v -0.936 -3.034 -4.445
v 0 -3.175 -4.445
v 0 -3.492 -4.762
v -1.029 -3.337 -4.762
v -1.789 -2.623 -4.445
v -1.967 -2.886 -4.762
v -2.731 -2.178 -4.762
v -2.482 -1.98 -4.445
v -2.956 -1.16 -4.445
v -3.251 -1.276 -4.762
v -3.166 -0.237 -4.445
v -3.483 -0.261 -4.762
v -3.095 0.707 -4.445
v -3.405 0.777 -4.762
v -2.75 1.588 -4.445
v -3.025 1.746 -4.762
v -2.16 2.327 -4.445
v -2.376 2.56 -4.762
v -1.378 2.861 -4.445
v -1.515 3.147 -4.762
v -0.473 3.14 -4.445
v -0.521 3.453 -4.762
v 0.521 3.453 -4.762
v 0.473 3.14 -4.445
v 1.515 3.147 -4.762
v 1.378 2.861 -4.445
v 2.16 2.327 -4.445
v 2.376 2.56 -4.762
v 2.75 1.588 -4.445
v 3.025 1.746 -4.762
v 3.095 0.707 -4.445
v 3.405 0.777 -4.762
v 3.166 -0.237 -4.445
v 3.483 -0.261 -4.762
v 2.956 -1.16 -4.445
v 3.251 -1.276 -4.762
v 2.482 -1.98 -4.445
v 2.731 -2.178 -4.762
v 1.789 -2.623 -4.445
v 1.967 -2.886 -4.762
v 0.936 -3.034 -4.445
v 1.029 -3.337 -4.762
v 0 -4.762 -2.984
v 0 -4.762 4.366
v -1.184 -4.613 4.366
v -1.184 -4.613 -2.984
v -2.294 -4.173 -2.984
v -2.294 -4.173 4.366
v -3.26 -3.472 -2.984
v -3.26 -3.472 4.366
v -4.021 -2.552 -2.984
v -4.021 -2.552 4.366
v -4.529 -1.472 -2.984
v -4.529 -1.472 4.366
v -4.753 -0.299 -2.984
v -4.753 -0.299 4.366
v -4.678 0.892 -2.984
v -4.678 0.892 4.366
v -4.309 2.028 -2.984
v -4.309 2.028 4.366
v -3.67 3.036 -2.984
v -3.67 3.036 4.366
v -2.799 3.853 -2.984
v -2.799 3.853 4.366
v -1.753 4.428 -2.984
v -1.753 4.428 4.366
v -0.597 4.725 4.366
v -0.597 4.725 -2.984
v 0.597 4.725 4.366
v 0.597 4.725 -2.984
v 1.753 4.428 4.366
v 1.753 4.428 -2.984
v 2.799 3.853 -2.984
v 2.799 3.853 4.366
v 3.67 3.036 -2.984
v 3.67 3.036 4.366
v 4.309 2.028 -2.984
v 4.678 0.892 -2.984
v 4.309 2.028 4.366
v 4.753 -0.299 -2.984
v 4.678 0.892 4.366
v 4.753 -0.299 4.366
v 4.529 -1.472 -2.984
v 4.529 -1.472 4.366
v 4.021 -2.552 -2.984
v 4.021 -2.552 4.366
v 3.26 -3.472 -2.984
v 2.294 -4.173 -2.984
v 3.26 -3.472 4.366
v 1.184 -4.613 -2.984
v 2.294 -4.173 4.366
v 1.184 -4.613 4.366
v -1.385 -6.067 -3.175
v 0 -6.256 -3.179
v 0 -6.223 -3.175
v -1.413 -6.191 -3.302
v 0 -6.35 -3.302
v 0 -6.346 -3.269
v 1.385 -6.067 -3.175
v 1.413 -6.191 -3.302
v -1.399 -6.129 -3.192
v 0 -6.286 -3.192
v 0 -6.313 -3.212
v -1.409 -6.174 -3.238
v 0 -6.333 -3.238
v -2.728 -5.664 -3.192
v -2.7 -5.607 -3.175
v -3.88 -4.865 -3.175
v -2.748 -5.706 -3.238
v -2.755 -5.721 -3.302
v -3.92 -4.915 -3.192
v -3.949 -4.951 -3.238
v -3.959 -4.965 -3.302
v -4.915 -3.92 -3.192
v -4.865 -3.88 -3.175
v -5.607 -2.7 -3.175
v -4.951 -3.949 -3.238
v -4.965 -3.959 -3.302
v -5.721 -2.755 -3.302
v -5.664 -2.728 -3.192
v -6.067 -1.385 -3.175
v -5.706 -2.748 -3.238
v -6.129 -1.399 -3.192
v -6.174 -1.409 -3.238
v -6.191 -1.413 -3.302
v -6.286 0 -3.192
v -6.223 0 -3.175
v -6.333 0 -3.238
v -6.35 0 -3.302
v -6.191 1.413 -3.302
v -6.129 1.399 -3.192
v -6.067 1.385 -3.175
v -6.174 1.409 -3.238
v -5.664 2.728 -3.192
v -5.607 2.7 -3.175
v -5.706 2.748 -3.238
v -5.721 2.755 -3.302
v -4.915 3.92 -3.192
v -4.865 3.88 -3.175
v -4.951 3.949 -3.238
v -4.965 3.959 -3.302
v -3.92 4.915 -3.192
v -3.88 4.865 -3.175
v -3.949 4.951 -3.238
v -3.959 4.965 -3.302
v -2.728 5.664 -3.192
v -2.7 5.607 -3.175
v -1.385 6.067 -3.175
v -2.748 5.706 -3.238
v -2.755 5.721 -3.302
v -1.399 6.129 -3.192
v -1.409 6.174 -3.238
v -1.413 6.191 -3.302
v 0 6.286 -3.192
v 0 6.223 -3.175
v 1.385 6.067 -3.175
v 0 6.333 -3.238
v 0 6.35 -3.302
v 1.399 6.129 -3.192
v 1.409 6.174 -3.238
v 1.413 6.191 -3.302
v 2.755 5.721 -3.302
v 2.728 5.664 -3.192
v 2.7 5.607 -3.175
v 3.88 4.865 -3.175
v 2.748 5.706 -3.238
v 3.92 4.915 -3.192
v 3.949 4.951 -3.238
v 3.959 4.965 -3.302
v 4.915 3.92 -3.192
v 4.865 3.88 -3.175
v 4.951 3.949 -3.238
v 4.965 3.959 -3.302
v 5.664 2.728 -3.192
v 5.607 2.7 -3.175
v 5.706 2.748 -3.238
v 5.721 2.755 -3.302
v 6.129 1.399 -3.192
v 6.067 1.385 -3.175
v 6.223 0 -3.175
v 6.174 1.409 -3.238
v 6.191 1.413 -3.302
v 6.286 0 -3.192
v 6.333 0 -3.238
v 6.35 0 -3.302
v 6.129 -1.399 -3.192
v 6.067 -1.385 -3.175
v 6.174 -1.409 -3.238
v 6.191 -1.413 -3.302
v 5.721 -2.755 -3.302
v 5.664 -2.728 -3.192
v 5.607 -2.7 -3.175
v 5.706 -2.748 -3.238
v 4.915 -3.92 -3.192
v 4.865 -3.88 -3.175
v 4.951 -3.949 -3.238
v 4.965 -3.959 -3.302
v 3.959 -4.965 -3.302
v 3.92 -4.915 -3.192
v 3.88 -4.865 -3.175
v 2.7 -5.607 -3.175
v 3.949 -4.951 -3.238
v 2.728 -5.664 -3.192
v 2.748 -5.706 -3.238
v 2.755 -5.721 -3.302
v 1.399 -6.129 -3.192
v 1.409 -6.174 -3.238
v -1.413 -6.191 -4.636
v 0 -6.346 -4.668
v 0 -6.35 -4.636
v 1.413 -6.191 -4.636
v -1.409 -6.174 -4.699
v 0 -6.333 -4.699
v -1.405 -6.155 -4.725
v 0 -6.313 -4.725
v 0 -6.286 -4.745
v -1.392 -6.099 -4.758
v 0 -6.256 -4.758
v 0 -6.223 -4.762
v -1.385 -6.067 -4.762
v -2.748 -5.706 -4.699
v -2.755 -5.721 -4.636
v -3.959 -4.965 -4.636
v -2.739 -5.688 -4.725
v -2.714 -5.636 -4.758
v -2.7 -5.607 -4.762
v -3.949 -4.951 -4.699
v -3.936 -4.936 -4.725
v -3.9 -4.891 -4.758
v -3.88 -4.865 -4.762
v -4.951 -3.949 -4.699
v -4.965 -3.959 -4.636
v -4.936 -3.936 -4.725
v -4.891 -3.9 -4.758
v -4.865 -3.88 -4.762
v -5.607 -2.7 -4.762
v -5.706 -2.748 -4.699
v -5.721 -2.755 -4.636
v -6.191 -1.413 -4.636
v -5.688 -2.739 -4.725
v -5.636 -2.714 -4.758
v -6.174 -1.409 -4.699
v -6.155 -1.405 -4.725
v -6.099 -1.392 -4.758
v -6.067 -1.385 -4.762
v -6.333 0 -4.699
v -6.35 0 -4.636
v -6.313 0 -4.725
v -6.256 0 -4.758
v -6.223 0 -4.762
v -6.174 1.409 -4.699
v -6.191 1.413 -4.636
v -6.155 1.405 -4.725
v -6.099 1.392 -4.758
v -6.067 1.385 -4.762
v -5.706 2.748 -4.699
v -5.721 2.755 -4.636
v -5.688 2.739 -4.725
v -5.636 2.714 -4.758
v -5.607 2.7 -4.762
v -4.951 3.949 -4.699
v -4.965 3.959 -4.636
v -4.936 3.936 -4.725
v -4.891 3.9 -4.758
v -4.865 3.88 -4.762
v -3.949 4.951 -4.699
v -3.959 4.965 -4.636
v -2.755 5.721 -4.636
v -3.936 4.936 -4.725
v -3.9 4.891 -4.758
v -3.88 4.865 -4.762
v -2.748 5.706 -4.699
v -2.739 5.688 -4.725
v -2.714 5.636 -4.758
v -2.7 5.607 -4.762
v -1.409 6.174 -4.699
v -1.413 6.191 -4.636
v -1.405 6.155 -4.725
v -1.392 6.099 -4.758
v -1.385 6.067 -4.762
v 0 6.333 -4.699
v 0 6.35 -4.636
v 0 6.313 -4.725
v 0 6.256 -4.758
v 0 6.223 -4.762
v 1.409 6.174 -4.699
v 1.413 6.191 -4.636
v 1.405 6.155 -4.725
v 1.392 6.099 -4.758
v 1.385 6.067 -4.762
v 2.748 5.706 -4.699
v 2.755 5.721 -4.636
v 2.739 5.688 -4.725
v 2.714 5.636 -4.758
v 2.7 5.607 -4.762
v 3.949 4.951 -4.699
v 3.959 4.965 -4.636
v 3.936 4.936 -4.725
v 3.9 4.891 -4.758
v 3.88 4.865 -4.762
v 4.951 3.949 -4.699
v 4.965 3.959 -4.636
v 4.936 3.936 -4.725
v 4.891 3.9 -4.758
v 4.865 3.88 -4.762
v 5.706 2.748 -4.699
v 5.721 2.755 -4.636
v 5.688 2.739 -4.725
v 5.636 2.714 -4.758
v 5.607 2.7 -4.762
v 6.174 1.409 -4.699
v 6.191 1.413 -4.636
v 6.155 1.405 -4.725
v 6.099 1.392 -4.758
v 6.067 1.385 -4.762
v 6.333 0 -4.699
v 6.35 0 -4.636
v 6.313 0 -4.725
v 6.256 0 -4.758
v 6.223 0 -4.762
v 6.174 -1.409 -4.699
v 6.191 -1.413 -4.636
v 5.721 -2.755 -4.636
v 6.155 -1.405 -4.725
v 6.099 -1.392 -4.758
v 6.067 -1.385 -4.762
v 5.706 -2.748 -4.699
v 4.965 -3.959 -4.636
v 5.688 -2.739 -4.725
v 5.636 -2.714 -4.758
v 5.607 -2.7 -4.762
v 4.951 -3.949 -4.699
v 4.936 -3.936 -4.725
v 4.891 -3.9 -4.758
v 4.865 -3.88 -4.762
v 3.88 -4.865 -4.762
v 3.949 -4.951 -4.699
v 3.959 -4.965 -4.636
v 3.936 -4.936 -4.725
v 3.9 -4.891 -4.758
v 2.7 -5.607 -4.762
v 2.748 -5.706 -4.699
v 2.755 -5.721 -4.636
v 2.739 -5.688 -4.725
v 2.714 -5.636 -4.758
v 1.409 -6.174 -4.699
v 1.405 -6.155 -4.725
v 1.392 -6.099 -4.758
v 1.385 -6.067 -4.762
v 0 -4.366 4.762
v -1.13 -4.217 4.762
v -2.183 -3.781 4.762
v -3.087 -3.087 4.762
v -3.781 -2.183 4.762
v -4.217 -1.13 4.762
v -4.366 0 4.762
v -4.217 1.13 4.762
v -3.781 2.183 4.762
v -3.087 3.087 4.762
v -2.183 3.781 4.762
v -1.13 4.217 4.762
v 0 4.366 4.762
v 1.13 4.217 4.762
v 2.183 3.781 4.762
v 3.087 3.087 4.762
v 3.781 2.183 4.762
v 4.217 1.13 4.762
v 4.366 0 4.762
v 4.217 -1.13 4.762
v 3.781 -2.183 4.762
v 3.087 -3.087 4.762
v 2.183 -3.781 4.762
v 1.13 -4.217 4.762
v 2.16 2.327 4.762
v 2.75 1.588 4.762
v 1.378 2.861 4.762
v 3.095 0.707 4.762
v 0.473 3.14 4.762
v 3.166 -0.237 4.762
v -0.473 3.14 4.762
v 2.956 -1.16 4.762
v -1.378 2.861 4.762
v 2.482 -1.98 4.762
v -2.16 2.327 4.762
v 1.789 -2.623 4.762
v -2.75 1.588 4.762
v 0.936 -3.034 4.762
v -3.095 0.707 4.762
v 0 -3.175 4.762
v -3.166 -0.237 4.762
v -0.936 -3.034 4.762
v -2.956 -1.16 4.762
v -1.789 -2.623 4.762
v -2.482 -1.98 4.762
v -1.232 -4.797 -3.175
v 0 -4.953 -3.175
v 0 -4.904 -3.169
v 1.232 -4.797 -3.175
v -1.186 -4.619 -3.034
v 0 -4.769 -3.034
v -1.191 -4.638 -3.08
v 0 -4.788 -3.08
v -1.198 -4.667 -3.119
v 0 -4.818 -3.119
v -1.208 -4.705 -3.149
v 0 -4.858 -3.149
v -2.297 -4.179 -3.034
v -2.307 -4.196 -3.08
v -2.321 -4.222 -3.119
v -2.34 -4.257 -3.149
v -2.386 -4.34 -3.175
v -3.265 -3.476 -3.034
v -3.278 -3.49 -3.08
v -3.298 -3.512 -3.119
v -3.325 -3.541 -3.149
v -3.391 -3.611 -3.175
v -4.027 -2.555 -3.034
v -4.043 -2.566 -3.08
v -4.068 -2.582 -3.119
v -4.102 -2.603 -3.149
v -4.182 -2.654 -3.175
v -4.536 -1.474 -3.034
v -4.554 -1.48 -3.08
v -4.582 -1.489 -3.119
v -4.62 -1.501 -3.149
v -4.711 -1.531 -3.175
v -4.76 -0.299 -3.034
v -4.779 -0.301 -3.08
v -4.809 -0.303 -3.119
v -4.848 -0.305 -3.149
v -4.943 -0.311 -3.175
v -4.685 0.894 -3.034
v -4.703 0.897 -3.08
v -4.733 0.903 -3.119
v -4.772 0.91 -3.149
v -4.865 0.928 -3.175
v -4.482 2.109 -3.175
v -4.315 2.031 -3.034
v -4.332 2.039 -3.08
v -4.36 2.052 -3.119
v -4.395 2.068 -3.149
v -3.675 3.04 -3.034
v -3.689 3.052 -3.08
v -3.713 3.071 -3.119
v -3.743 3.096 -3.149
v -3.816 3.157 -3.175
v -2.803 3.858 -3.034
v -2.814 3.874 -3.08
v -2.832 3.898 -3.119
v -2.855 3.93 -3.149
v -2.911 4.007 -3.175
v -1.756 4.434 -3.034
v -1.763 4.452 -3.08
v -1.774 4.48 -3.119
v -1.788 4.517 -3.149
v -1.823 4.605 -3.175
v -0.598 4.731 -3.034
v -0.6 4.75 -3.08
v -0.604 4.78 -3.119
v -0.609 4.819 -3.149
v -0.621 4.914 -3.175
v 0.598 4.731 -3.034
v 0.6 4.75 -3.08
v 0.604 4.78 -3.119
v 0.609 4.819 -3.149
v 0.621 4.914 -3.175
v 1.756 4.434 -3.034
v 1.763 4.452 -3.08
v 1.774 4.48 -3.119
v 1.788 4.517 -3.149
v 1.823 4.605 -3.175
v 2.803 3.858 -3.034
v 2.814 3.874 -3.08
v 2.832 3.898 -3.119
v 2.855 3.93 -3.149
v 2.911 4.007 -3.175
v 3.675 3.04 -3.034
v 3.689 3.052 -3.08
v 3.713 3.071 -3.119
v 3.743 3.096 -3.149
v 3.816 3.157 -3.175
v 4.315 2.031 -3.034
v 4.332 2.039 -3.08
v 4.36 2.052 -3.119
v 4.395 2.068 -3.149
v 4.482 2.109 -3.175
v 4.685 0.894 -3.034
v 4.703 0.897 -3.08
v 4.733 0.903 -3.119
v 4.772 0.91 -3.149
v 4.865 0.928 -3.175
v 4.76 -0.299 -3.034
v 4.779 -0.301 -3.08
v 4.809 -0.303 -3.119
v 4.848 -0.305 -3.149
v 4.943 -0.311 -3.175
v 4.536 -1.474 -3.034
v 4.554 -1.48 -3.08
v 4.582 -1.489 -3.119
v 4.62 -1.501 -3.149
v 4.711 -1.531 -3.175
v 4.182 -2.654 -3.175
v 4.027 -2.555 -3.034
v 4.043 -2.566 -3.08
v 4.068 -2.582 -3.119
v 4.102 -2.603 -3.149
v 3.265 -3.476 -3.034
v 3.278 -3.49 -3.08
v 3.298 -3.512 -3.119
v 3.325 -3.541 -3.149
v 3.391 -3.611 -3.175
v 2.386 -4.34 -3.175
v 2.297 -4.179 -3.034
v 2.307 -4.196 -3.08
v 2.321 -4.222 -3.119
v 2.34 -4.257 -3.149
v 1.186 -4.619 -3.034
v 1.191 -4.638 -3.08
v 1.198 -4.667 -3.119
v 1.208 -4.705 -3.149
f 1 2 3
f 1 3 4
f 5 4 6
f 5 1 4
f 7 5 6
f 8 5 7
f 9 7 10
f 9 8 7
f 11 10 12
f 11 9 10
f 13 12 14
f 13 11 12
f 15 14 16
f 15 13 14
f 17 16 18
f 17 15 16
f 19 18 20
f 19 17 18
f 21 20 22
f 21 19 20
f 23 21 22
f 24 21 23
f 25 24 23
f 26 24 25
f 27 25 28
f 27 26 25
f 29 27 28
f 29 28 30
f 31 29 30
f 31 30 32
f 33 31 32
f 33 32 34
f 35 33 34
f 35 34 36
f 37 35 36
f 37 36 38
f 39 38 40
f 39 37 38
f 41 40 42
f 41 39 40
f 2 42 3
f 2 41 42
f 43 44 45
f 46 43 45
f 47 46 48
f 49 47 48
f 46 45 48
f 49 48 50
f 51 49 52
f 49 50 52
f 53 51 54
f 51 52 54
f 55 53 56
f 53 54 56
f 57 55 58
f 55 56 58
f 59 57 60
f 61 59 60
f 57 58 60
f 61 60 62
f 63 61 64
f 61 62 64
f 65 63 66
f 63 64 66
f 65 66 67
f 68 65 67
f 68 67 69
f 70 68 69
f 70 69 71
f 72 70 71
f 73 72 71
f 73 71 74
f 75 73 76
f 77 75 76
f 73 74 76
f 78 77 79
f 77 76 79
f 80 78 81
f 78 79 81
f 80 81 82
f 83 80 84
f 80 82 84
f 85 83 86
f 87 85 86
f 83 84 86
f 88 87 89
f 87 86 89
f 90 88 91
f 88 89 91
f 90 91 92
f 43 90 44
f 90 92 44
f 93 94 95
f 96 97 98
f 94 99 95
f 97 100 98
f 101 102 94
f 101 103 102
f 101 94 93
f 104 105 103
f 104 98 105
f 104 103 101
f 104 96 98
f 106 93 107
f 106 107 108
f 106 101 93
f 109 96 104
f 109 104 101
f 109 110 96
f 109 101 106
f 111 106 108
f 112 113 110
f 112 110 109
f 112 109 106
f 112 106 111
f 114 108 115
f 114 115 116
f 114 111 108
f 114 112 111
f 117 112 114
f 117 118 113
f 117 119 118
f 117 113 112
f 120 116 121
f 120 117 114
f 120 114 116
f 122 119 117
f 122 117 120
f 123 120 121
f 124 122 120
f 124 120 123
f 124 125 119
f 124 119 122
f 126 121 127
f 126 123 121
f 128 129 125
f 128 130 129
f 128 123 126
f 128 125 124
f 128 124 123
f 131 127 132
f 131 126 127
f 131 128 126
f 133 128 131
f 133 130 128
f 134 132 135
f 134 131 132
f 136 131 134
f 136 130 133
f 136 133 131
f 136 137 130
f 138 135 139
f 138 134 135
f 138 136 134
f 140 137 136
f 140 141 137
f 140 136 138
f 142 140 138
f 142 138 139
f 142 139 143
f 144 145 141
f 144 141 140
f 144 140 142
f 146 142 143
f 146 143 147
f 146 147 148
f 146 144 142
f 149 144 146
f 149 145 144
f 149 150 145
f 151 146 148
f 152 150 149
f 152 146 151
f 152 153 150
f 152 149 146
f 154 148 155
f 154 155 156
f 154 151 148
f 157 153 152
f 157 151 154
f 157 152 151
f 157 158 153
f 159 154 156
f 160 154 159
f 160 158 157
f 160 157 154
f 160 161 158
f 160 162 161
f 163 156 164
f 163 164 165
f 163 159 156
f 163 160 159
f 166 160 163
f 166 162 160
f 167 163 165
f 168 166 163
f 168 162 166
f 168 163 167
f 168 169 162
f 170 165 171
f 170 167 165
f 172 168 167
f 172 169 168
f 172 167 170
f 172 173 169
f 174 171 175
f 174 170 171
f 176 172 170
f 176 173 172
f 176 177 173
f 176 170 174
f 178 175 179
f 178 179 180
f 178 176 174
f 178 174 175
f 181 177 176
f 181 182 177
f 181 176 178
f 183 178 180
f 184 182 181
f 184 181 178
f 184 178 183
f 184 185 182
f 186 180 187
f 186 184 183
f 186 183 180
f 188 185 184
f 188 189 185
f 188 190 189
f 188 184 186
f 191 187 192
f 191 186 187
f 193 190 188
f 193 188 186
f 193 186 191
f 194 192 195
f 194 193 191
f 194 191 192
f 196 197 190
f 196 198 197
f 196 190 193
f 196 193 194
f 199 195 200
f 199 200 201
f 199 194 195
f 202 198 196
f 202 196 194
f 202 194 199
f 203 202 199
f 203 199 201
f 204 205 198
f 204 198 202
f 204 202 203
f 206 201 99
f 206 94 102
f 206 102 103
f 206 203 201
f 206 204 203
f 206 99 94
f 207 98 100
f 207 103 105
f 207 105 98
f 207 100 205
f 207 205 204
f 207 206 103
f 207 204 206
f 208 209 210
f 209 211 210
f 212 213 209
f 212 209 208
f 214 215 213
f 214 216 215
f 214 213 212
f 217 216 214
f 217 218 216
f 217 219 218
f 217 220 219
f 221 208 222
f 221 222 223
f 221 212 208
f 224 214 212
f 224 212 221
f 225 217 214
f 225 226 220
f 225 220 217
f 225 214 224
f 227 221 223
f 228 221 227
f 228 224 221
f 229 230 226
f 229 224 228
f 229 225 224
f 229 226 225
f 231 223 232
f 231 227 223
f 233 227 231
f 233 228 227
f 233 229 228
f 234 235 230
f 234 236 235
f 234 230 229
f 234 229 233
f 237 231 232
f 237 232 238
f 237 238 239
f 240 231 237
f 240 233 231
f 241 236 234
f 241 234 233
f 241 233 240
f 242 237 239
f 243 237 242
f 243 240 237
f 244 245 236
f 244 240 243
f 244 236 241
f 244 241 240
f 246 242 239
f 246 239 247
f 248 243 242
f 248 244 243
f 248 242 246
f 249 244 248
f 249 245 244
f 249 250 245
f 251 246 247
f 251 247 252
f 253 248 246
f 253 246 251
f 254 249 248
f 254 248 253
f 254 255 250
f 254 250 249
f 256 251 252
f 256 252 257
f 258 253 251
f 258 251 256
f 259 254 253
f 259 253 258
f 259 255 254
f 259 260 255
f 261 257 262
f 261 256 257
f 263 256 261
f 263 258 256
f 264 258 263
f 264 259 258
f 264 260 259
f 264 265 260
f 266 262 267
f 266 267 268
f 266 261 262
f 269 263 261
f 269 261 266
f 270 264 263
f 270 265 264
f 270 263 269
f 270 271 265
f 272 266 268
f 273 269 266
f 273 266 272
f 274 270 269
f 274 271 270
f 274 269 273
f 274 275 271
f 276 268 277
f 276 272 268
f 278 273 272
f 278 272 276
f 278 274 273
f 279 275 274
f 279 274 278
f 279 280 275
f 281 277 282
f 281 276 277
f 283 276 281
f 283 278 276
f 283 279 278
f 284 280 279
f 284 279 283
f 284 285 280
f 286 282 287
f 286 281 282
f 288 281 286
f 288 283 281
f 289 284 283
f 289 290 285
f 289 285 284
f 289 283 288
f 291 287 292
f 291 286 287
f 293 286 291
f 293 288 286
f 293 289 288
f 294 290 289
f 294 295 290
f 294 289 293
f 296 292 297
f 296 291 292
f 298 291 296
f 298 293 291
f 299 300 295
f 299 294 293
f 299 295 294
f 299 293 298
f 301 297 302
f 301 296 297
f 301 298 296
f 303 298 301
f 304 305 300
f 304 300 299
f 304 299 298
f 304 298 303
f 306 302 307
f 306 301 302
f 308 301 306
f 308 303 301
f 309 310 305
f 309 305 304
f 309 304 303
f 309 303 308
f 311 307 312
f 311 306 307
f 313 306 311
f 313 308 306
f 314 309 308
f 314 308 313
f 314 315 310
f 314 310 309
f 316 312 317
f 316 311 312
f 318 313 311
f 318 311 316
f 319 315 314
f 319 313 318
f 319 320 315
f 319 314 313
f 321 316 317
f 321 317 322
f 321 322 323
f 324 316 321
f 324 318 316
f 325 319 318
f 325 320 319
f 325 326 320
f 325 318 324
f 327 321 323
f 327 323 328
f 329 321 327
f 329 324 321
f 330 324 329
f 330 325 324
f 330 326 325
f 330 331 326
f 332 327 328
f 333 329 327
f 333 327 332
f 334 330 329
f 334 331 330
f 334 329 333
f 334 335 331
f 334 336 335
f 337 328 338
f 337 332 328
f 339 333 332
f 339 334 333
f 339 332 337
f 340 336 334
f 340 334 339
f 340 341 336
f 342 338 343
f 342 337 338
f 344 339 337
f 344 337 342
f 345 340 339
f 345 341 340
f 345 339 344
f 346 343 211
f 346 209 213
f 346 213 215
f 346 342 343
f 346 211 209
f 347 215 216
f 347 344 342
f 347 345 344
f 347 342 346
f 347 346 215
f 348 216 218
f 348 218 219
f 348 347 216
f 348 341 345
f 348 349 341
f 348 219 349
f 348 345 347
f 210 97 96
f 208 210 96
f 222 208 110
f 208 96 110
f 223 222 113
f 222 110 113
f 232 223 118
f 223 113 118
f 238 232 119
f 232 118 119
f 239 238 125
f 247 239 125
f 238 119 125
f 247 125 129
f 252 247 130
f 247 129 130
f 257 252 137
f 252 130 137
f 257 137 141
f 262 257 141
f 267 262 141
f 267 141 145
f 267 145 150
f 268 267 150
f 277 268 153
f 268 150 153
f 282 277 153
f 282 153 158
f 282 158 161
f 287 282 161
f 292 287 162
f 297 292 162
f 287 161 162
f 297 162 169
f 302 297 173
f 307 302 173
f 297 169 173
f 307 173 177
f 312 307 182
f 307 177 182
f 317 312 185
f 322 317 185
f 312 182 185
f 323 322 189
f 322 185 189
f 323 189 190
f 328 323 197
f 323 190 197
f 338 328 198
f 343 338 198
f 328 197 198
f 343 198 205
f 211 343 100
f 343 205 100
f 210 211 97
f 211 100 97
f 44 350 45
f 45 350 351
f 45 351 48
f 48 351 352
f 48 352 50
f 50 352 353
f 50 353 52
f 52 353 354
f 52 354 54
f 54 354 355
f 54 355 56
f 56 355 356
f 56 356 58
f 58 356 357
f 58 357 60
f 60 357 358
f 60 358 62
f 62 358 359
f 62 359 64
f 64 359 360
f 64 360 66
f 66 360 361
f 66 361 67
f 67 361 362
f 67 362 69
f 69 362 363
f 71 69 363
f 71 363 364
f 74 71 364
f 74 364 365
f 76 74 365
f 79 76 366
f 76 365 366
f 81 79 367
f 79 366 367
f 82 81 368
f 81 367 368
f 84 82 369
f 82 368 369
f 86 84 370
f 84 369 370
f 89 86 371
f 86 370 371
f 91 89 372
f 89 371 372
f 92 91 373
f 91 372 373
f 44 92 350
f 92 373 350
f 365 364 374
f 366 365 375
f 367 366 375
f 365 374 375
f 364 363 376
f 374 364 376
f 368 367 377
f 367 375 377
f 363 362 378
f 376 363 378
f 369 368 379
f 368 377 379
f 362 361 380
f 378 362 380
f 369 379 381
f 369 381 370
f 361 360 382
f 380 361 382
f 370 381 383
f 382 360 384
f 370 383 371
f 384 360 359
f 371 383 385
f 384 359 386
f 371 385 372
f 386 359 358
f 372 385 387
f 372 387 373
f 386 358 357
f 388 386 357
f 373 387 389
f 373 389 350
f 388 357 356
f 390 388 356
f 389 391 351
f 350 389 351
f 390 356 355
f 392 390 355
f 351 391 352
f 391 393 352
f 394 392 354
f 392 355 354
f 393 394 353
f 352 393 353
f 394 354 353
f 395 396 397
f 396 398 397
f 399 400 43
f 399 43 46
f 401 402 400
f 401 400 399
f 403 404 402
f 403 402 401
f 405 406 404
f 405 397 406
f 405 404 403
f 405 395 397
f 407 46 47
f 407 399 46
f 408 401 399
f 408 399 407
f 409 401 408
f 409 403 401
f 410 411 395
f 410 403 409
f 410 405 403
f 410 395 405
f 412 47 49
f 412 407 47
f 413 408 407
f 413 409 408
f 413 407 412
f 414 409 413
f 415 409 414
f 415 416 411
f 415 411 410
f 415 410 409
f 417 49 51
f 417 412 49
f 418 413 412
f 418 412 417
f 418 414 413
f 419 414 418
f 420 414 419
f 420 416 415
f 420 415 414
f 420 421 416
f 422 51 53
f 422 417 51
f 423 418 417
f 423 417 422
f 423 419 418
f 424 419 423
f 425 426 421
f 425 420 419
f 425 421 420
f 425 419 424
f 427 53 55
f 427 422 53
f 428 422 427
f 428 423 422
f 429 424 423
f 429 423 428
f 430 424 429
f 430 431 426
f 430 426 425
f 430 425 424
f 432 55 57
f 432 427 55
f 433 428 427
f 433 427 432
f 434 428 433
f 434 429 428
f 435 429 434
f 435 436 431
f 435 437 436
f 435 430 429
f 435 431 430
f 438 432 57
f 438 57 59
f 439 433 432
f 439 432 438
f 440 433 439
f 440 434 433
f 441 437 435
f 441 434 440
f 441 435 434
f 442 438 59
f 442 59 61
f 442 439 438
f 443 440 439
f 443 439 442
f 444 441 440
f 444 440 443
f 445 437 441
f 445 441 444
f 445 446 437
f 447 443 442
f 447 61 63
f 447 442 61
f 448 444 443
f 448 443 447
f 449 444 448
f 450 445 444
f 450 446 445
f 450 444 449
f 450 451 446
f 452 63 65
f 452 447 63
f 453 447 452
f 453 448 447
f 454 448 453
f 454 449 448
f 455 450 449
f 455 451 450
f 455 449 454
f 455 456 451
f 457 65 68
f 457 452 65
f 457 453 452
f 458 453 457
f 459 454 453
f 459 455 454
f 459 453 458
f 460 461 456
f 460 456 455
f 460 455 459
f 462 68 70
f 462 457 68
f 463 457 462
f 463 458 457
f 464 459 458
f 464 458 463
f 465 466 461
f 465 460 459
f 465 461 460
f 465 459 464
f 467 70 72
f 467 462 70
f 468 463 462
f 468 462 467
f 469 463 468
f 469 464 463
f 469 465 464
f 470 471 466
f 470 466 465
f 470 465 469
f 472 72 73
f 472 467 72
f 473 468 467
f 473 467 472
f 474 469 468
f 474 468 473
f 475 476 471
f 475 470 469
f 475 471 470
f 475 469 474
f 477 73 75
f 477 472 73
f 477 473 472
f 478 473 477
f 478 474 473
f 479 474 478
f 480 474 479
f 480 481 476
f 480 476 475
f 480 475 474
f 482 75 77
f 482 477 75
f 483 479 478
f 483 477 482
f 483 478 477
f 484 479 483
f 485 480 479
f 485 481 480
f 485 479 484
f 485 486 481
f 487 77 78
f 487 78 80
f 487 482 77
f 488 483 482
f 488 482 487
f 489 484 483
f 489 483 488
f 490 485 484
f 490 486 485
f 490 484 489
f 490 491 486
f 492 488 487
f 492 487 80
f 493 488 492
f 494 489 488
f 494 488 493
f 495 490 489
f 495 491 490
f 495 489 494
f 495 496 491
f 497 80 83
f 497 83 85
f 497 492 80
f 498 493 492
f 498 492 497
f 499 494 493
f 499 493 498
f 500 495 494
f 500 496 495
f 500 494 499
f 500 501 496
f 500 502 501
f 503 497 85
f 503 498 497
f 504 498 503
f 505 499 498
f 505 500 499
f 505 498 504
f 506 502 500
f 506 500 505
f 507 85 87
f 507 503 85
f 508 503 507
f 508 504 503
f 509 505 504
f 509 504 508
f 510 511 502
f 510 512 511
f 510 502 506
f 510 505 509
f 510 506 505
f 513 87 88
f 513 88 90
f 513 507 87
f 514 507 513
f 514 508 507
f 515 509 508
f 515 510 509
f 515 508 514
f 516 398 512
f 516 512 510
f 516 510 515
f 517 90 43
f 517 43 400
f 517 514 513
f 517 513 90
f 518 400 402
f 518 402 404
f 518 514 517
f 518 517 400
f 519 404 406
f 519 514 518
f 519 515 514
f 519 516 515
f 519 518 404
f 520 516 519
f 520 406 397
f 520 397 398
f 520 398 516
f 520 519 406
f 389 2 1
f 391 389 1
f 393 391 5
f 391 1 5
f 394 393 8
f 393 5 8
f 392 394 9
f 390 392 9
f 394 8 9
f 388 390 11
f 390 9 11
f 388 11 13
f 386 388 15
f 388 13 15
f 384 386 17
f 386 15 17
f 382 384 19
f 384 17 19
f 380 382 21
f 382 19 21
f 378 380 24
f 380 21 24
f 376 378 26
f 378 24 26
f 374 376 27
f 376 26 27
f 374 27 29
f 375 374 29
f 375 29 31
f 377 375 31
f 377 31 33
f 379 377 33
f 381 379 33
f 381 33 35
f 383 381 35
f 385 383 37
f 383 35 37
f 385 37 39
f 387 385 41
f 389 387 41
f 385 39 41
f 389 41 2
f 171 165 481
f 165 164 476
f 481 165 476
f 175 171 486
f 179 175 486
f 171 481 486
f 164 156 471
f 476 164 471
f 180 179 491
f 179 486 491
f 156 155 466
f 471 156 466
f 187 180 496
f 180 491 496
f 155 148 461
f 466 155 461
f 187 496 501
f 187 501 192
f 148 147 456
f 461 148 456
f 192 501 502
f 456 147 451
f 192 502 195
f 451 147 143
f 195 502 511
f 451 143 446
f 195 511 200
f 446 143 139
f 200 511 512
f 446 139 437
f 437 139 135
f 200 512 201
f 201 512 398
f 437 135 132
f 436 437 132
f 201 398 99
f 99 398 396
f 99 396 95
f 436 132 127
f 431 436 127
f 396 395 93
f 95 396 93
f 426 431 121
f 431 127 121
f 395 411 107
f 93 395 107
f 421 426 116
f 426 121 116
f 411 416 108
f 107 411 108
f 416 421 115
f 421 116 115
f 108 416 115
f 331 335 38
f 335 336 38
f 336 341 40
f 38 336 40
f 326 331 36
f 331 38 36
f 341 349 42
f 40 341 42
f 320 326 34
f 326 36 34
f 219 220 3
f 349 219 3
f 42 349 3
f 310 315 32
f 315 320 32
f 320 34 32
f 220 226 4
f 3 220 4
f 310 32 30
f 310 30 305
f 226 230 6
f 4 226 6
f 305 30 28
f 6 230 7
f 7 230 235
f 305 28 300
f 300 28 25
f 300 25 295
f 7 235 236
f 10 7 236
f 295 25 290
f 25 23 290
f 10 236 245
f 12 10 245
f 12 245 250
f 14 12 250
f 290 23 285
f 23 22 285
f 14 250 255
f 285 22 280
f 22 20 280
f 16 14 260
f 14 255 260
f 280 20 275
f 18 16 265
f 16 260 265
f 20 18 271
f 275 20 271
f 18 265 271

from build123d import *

# Parameters (mm, degrees)
CHAMFER1_SIZE = 0.396875
FILLET1_R     = 0.1905
FILLET2_R     = 0.127
CHAMFER2_SIZE = 0.3175


with BuildPart() as part:
    # Sketch3 → Revolve1 (revolve)
    with BuildSketch(Plane(origin=(0, 0, 0), x_dir=(0, 0, -1), z_dir=(1, 0, 0)), mode=Mode.PRIVATE) as revolve1_sk:
        Polygon((-4.7625, 3.175), (4.7625, 3.175), (4.7625, 6.35), (3.175, 6.35), (3.175, 4.7625), (-4.7625, 4.7625), align=None)
    revolve(revolve1_sk.sketch.rotate(Axis((0, 0, 4.7625), (0, 0, -1)), 180), axis=Axis((0, 0, 4.7625), (0, 0, -1)))

    # Chamfer1
    chamfer1_edges = [part.edges().sort_by_distance(p)[0] for p in [
        (0, 4.7625, 4.7625),
    ]]
    chamfer(chamfer1_edges, length=CHAMFER1_SIZE)

    # Fillet1
    fillet1_edges = [part.edges().sort_by_distance(p)[0] for p in [
        (0, 4.7625, -3.175),
    ]]
    fillet(fillet1_edges, radius=FILLET1_R)

    # Fillet2
    fillet2_edges = [part.edges().sort_by_distance(p)[0] for p in [
        (0, 6.35, -3.175),
        (0, 6.35, -4.7625),
    ]]
    fillet(fillet2_edges, radius=FILLET2_R)

    # Chamfer2
    chamfer2_edges = [part.edges().sort_by_distance(p)[0] for p in [
        (0, 3.175, -4.7625),
    ]]
    chamfer(chamfer2_edges, length=CHAMFER2_SIZE)


solid = part.part
